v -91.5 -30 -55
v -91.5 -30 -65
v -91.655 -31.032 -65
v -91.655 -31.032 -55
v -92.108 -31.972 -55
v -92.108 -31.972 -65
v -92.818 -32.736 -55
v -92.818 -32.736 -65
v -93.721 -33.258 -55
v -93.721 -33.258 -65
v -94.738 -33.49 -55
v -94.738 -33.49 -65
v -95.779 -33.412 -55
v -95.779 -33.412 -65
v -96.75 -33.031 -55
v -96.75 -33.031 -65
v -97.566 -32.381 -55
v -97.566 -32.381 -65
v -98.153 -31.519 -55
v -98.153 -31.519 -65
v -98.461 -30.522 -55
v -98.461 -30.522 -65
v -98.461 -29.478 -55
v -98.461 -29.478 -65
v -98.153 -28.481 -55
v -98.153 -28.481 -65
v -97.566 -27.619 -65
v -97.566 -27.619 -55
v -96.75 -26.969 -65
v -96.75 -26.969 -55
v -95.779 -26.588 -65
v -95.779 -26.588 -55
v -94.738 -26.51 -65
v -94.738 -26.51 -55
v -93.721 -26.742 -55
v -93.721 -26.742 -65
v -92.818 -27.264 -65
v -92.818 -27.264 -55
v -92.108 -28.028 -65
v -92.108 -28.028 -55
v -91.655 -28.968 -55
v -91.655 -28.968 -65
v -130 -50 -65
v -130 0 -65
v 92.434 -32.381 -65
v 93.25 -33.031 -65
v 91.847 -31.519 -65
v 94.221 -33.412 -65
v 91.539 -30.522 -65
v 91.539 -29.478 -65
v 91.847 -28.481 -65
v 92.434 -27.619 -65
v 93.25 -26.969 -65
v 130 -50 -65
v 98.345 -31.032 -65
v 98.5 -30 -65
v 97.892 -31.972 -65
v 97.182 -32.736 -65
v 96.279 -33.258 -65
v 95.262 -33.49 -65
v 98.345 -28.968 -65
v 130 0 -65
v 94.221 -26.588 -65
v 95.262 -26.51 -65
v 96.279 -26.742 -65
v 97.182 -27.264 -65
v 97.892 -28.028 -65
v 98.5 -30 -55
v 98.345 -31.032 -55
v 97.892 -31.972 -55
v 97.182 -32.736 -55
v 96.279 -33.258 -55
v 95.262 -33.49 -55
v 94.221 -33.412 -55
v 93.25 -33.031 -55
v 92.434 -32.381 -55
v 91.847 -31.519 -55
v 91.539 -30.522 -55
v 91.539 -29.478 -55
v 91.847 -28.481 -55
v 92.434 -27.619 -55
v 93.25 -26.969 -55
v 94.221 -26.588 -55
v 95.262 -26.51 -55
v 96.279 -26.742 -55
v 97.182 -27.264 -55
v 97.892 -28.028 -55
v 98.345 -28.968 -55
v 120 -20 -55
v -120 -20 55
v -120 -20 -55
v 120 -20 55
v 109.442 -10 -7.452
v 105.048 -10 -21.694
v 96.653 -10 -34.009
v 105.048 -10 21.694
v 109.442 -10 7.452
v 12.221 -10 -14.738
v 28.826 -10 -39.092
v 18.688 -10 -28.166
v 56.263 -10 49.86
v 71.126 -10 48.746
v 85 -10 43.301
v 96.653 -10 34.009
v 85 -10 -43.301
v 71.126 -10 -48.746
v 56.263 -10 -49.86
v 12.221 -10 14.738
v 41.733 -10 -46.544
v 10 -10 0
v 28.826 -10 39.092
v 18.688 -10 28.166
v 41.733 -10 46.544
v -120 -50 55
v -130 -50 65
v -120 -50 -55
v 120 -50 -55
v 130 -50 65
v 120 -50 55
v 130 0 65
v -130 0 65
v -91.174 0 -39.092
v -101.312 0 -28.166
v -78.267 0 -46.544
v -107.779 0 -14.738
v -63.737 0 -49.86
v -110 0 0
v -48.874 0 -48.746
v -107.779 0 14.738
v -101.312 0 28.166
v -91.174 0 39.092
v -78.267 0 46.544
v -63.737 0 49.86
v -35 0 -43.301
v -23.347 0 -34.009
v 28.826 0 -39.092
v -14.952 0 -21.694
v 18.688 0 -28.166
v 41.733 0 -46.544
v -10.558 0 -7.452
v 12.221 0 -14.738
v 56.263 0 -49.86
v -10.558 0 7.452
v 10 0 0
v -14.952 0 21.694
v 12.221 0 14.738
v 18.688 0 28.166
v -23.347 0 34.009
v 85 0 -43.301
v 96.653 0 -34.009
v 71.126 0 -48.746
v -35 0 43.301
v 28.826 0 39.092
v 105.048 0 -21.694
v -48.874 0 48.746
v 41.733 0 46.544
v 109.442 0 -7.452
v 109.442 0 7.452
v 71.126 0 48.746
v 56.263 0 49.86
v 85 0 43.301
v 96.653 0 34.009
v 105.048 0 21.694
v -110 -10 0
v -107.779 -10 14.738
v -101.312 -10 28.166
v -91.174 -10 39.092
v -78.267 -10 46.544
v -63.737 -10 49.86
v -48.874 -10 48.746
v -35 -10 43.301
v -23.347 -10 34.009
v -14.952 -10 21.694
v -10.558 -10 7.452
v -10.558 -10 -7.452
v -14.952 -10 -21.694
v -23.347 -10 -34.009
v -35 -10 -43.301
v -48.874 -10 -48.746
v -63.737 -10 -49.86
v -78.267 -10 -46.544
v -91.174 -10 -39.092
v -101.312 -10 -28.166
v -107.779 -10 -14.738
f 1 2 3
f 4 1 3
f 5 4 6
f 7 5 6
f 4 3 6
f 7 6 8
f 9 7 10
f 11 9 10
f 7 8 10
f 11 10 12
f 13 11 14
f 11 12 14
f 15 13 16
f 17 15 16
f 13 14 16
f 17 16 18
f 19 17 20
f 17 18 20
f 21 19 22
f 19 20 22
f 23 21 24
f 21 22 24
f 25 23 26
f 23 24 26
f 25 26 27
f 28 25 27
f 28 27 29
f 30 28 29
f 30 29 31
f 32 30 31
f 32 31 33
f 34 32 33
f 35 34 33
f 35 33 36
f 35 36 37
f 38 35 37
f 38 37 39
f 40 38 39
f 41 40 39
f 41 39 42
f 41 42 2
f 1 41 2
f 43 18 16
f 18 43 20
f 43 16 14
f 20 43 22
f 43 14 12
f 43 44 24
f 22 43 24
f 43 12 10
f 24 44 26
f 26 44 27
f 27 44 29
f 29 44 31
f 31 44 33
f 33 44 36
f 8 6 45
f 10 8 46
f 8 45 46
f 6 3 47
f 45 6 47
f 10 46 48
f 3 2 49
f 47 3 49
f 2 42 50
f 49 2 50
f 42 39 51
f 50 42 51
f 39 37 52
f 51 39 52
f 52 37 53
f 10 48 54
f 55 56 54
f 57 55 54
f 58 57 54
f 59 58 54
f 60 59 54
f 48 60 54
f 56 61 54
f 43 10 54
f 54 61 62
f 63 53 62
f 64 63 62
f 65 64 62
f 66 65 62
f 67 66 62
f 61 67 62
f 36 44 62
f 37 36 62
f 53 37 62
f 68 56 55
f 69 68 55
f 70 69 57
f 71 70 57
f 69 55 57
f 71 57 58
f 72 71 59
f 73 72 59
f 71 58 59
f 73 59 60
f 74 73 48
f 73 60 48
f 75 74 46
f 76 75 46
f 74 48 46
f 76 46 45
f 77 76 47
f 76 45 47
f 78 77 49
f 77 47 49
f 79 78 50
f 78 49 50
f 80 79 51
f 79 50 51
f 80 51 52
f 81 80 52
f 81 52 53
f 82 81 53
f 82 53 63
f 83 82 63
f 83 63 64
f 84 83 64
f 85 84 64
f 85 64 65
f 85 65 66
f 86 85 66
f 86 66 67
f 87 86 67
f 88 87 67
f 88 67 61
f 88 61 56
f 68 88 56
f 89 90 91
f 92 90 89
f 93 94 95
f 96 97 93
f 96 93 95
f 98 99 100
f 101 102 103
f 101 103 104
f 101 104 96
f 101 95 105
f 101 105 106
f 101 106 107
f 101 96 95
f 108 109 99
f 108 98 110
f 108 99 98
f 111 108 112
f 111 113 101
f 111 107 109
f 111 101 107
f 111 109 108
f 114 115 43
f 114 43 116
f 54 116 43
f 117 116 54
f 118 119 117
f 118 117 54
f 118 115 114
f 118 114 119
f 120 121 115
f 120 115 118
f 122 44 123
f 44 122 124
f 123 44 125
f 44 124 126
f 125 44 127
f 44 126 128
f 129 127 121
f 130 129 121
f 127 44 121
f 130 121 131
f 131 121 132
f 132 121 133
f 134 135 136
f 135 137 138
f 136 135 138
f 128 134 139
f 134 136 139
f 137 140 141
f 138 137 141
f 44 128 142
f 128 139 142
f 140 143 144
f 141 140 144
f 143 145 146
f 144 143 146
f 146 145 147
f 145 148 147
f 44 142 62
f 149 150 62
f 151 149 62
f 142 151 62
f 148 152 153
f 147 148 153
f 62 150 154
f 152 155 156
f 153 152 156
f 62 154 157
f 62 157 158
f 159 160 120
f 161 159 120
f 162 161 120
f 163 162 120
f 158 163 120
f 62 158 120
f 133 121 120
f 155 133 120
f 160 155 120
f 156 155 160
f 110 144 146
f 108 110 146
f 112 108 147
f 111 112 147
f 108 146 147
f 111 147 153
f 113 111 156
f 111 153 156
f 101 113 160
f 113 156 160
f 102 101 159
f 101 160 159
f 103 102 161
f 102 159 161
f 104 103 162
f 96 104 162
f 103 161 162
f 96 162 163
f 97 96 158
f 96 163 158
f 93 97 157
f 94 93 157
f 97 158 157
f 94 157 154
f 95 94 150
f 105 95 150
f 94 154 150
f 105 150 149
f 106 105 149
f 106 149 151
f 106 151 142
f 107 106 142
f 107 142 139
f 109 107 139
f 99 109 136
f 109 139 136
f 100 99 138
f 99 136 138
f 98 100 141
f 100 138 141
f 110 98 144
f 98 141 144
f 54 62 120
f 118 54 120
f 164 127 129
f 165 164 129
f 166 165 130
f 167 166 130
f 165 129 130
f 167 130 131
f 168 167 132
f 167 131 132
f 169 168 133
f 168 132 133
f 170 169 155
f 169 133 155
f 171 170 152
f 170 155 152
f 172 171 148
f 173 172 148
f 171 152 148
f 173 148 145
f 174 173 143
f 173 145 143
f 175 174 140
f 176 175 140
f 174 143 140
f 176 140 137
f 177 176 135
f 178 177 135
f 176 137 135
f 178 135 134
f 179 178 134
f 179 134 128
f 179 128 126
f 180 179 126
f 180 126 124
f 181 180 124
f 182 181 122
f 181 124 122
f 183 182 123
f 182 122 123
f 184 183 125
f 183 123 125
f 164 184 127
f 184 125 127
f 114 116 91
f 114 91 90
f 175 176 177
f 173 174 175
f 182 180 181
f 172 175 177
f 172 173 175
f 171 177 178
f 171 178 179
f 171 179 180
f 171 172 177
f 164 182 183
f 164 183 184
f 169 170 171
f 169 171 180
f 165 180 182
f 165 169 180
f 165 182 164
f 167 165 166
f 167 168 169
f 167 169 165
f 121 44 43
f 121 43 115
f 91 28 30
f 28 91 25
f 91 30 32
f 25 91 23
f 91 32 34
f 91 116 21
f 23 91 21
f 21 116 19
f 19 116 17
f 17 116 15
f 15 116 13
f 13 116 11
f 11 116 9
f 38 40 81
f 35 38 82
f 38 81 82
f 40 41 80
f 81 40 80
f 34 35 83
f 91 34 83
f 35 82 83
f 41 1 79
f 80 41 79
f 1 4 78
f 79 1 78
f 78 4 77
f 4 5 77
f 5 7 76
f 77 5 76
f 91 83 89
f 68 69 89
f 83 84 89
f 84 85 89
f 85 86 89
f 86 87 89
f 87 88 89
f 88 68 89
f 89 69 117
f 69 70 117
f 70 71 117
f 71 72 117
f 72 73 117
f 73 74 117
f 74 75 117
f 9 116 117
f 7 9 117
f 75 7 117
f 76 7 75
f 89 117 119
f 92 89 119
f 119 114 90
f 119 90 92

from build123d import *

# Parameters (mm, degrees)
F0_W     = 260
F0_H     = 130
F1_DEPTH = 50
F2_R     = 50
F3_DEPTH = 10
F4_W     = 240
F4_H     = 110
F5_DEPTH = 30
F6_R     = 3.5
F7_DEPTH = 50


with BuildPart() as f1:
    # F0 (on Front) → F1 (new body)
    with BuildSketch(Plane.XZ):
        Rectangle(F0_W, F0_H)
    extrude(amount=F1_DEPTH)

    # F2 (on face) → F3 (cut)
    with BuildSketch(Plane(origin=(0, 0, 0), x_dir=(-1, 0, 0), z_dir=(0, 1, 0))):
        with Locations((60, 0)):
            Circle(F2_R)
        with Locations((-60, 0)):
            Circle(F2_R)
    extrude(amount=-F3_DEPTH, mode=Mode.SUBTRACT)

    # F4 (on face) → F5 (cut)
    with BuildSketch(Plane.XZ.offset(50)):
        Rectangle(F4_W, F4_H)
    extrude(amount=-F5_DEPTH, mode=Mode.SUBTRACT)

    # F6 (on face) → F7 (cut)
    with BuildSketch(Plane(origin=(0, 0, -65), x_dir=(1, 0, 0), z_dir=(0, 0, -1))):
        with Locations((95, 30)):
            Circle(F6_R)
        with Locations((-95, 30)):
            Circle(F6_R)
    extrude(amount=-F7_DEPTH, mode=Mode.SUBTRACT)


solid = f1.part
